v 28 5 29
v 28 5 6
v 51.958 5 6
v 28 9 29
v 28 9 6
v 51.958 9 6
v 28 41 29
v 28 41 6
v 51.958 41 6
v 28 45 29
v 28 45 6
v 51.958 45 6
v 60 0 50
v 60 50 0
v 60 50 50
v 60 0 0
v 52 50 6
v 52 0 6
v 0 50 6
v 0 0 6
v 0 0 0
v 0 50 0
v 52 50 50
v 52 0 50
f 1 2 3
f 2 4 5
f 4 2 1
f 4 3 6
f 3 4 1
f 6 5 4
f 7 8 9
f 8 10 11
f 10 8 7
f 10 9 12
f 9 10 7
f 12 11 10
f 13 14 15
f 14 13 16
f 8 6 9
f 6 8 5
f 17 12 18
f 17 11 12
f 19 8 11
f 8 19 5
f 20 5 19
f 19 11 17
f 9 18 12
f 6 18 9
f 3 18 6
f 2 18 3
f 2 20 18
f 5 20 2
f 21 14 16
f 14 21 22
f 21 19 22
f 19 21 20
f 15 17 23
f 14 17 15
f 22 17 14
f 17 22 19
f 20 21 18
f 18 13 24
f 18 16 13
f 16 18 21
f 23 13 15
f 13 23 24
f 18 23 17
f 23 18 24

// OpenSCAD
$fn = 32;

// ----------------------------------------------------------------------
// Rib bracket: 2-gusset L bracket
// ----------------------------------------------------------------------

// --- parameters (mm) ---
base_l = 60;              // foot length, X
base_w = 50;              // foot width, Y
base_t = 6;               // foot thickness
plate_t = 8;              // upright plate thickness
plate_h = 50;             // overall height
gus_l = 24;               // gusset leg along the foot
gus_h = 24;               // gusset height
gus_t = 4;                // gusset thickness
gus_edge = 5;             // gusset margin from the foot edge
n_gus = 2;                // gusset count

gus_pitch = (base_w - 2 * gus_edge - gus_t) / (n_gus - 1);  // gusset pitch

union() {
  cube([base_l, base_w, base_t]);
  translate([base_l - plate_t, 0, base_t - 1])
    cube([plate_t, base_w, plate_h - base_t + 1]);
  for (i = [0 : n_gus - 1])
    translate([base_l - plate_t - gus_l, gus_edge + i * gus_pitch, base_t - 1])
      rotate([-90, 0, 0])
        linear_extrude(height = gus_t)
          polygon(points = [[0, 0], [gus_l + 1, 0], [0, -gus_h]]);
}
